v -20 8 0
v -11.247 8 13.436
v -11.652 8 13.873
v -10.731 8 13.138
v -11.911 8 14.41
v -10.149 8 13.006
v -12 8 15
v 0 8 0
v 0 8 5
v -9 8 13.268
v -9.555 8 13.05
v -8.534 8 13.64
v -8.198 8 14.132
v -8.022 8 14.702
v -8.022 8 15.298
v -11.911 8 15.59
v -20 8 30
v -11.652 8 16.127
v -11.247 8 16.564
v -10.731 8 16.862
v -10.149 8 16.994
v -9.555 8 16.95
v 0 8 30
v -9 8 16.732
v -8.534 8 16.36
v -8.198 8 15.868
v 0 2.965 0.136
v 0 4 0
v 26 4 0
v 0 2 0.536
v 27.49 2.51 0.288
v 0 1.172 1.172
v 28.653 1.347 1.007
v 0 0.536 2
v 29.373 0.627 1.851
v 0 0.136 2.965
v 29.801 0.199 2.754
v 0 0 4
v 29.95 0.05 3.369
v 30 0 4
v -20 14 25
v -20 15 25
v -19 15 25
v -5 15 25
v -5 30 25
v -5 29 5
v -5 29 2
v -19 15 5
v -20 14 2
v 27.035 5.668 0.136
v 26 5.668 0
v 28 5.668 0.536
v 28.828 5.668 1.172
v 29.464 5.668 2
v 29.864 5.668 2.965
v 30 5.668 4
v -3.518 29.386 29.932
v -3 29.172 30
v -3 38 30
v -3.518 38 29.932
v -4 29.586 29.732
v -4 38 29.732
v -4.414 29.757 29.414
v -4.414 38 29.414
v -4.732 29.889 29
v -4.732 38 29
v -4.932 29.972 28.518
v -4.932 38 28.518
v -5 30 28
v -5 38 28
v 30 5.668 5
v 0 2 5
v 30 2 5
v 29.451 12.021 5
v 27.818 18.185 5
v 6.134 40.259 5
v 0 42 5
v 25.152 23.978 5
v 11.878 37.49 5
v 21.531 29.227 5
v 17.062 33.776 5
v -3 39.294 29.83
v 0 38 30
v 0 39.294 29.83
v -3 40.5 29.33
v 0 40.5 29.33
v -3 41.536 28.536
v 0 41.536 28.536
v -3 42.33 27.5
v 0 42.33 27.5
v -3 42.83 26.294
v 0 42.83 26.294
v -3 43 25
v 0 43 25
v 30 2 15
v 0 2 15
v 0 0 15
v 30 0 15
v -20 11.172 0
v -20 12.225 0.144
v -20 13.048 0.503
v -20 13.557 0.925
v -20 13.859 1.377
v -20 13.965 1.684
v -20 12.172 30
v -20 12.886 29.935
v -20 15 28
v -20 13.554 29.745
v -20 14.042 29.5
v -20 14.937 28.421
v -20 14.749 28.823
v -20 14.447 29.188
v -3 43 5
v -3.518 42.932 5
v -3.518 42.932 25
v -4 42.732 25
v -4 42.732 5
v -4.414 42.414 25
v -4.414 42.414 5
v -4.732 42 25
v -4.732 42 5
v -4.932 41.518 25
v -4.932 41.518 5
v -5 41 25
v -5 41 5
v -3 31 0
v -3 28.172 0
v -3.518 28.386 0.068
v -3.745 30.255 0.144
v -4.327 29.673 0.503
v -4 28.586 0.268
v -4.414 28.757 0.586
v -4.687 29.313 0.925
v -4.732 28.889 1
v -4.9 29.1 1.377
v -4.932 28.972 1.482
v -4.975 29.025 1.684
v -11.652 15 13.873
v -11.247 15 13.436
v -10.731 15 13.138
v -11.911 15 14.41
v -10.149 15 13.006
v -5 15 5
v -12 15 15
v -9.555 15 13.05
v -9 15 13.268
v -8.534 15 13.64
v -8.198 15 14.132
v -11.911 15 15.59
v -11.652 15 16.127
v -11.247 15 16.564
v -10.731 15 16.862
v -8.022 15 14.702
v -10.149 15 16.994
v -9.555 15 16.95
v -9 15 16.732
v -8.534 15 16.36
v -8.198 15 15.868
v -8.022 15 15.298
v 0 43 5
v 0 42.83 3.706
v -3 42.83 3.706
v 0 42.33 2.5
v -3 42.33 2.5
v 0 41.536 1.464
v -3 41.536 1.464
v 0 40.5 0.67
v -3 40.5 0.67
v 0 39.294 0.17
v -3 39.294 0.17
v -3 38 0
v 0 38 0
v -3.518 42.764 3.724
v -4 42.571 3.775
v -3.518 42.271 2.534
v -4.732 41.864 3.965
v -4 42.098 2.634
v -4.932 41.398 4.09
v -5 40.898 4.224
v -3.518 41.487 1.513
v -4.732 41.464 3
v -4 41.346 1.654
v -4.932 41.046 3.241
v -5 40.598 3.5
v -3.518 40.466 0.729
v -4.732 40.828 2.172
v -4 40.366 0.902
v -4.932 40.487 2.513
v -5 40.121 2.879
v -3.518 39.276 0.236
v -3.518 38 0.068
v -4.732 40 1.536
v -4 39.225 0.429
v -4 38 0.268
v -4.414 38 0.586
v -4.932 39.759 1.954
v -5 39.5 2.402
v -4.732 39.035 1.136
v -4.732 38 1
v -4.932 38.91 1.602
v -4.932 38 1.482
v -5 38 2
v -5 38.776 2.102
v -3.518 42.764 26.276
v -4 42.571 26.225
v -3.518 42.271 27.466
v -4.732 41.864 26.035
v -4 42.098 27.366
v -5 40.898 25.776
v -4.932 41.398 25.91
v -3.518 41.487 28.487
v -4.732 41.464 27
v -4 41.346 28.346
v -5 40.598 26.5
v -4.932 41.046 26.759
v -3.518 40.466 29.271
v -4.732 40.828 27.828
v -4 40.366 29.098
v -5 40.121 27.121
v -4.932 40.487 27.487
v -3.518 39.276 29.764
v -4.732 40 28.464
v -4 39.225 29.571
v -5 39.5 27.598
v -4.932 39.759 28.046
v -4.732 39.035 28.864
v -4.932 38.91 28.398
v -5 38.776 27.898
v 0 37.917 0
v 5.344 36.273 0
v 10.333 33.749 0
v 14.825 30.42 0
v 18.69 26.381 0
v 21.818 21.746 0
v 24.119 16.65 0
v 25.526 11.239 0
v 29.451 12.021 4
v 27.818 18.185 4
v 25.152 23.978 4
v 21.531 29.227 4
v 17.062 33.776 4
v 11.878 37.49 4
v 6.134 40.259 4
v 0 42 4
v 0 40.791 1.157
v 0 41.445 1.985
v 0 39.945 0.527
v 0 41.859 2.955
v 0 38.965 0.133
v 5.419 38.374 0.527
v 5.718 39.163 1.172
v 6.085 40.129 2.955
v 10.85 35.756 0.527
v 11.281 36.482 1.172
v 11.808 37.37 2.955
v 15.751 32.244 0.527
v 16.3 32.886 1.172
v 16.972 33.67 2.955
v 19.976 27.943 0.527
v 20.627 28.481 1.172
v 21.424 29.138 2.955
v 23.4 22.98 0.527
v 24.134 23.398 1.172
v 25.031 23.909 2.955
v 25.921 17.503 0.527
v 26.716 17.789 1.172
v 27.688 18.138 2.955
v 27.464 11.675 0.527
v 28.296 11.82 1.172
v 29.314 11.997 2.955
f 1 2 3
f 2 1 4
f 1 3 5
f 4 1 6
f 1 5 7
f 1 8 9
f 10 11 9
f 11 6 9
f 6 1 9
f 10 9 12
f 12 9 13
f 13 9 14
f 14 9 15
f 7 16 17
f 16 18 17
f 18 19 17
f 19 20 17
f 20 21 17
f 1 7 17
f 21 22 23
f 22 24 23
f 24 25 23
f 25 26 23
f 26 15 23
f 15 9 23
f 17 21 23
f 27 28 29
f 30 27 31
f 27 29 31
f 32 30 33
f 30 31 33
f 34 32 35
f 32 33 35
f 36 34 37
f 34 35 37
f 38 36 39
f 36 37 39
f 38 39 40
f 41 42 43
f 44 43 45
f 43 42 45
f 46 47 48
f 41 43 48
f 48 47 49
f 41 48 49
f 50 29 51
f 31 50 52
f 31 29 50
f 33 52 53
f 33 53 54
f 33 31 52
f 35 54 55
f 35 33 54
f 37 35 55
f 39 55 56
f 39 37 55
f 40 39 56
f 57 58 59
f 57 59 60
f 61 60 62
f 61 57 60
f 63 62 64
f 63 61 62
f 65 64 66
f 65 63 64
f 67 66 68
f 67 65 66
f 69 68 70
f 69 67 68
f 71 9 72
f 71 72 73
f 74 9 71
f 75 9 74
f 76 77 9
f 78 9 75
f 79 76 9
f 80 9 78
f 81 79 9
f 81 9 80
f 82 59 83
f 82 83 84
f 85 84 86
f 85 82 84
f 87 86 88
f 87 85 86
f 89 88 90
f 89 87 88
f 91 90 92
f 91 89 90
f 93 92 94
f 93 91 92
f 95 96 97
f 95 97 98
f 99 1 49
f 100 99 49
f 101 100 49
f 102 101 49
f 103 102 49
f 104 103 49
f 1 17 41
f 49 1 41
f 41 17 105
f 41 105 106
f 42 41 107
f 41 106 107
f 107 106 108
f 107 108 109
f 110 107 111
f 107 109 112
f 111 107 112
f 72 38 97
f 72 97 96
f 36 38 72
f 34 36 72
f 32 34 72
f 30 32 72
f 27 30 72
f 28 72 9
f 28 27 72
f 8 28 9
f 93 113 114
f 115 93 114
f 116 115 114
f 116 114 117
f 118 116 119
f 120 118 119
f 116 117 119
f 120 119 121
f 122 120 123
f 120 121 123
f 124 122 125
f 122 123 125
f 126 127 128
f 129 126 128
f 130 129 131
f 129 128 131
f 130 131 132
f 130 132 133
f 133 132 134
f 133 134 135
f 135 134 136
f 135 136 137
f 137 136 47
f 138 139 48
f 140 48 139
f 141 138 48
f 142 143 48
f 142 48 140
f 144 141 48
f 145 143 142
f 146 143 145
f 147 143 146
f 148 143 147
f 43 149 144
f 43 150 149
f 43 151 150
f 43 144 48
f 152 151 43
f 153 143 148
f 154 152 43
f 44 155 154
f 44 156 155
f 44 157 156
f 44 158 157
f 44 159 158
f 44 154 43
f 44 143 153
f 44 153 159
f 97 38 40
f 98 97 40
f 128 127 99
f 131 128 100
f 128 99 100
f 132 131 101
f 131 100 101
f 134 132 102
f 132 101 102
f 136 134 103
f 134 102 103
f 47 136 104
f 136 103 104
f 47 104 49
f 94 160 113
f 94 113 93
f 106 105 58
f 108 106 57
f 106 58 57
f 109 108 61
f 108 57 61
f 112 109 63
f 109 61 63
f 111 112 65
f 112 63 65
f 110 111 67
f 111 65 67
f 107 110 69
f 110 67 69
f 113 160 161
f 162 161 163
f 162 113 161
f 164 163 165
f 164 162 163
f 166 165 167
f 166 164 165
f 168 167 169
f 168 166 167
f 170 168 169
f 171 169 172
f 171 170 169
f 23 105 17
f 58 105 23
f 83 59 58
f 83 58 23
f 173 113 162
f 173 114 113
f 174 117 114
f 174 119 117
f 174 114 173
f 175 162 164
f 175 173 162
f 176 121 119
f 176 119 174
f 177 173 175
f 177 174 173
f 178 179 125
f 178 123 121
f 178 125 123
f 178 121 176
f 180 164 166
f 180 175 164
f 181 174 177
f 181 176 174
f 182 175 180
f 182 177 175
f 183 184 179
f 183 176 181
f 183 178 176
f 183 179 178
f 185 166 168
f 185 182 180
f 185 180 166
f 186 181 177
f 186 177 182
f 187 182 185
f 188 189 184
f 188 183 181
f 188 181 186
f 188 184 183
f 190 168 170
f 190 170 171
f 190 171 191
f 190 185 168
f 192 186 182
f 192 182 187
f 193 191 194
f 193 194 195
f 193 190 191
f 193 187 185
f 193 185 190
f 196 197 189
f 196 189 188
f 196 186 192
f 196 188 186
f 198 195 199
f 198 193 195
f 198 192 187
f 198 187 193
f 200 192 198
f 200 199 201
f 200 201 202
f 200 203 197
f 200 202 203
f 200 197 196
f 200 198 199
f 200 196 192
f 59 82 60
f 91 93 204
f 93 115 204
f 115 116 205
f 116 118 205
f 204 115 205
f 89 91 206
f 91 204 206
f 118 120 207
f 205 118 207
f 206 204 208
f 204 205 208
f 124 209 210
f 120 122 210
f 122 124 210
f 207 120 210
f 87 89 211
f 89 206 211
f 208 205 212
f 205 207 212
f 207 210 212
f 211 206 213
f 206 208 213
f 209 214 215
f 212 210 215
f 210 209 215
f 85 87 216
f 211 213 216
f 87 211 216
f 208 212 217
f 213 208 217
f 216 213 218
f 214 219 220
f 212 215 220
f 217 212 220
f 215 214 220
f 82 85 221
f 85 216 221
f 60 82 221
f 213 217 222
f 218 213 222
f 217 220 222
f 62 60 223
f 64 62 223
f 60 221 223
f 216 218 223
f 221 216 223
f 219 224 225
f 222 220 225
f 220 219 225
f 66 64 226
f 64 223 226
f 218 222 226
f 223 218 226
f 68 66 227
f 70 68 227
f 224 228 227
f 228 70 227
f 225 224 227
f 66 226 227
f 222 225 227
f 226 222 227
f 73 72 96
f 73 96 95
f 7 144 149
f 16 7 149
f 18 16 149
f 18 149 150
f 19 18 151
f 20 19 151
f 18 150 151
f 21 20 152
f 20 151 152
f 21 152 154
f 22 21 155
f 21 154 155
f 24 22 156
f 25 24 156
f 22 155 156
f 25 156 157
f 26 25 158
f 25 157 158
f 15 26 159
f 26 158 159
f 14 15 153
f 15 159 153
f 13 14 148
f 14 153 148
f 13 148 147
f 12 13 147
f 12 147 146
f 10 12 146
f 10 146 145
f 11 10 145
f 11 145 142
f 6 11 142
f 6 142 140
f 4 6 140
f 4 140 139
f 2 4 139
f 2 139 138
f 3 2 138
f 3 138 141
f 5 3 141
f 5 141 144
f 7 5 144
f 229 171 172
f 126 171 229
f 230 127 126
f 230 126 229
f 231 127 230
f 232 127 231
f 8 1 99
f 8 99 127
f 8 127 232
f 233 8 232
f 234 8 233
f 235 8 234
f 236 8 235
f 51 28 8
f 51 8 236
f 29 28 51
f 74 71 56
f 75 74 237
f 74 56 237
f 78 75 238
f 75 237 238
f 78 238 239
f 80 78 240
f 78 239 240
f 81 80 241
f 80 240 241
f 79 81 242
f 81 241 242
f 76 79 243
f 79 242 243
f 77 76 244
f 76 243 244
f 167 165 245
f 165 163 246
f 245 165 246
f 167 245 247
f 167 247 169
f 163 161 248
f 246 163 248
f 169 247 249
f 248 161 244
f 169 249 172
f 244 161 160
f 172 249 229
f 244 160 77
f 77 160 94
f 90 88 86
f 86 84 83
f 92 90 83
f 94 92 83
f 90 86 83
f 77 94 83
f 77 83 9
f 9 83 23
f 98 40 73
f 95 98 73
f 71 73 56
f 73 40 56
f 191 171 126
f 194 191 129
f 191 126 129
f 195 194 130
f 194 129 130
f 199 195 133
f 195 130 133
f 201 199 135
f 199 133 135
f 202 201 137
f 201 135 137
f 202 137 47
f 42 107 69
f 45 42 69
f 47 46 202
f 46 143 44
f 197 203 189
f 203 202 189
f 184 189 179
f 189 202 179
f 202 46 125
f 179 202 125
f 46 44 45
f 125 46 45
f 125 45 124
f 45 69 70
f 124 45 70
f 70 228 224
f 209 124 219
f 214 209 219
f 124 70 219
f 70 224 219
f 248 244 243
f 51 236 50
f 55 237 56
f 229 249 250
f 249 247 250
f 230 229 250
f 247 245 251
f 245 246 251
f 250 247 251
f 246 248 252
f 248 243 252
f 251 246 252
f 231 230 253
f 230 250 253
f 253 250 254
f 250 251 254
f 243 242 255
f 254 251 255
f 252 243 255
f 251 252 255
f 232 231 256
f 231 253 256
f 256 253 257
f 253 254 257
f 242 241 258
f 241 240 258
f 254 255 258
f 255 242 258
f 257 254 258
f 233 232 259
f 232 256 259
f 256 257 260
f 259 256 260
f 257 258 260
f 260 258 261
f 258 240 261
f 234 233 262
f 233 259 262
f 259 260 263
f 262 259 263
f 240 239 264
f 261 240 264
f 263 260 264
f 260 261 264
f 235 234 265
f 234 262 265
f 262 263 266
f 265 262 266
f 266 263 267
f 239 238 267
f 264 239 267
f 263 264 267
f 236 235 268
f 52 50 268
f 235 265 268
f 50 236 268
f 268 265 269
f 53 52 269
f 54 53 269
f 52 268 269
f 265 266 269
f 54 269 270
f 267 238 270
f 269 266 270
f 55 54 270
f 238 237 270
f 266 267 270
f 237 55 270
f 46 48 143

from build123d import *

# Parameters (mm, degrees)
F0_W          = 30
F0_H          = 42
F1_DEPTH      = 5
F2_T1_DEPTH   = 186.6590212458
F3_W          = 30
F3_H          = 2
F4_DEPTH      = 10
F5_W          = 35
F5_H          = 30
F6_DEPTH      = 5
F7_W          = 7
F7_H          = 30
F8_DEPTH      = 15
F9_R          = 2
F10_DEPTH     = 10
F11_R         = 4
F12_W         = 15
F12_H         = 14
F13_DEPTH     = 5
F14_W         = 15
F14_H         = 15
F15_DEPTH     = 5
F16_T4_DEPTH  = 35.8601958556
F16_T9_DEPTH  = 35.8601958556
F17_R         = 5
F18_T1_DEPTH  = 20
F18_T6_DEPTH  = 9.5699020722
F18_T11_DEPTH = 31.2132034356
F18_T16_DEPTH = 31.2132034356
F18_T21_DEPTH = 14
F18_T24_ANGLE = 90
F18_T26_ANGLE = 90
F18_T30_DEPTH = 13
F18_T36_DEPTH = 14
F18_T40_DEPTH = 31.2132034356
F18_T47_DEPTH = 13
F18_T51_DEPTH = 31.2132034356


# Not quite as in the source:
# - a fillet or chamfer that OpenCascade refuses, or shapes differently, is made with other operations: its cross-section is extruded or revolved along the edge and cut away or added


with BuildPart() as f1:
    # F0 (on Top) → F1 (new body)
    with BuildSketch(Plane.XY):
        with Locations((15, 21)):
            Rectangle(F0_W, F0_H)
    extrude(amount=F1_DEPTH)

    # F2: fillet of radius 37 on 1 edges, made by hand

    # F2_s2 → F2_t1 (cut)
    with BuildSketch(Plane.XY.offset(-90.8295106229)):
        with BuildLine():
            ThreePointArc((30, 5.6681957508), (21.5306852354, 29.2266337296), (0, 42))
            Line((0, 42), (30, 42))
            Line((30, 42), (30, 5.6681957508))
        make_face()
    extrude(amount=F2_T1_DEPTH, mode=Mode.SUBTRACT)

    # F3 (on face) → F4 (join)
    with BuildSketch(Plane.XY.offset(5)):
        with Locations((15, 1)):
            Rectangle(F3_W, F3_H)
    extrude(amount=F4_DEPTH)

    # F5 (on face) → F6 (join)
    with BuildSketch(Plane(origin=(0, 0, 0), x_dir=(0, -1, 0), z_dir=(-1, 0, 0))):
        with Locations((-25.5, 15)):
            Rectangle(F5_W, F5_H)
    extrude(amount=F6_DEPTH)

    # F7 (on face) → F8 (join)
    with BuildSketch(Plane(origin=(-5, 0, 0), x_dir=(0, -1, 0), z_dir=(-1, 0, 0))):
        with Locations((-11.5, 15)):
            Rectangle(F7_W, F7_H)
    extrude(amount=F8_DEPTH)

    # F9 (on face) → F10 (cut)
    with BuildSketch(Plane(origin=(0, 15, 0), x_dir=(-1, 0, 0), z_dir=(0, 1, 0))):
        with Locations((10, 15)):
            Circle(F9_R)
    extrude(amount=-F10_DEPTH, mode=Mode.SUBTRACT)

    # F11
    f11_edges = [f1.edges().sort_by_distance(p)[0] for p in [
        (21.530685, 29.226634, 0),
        (15, 0, 0),
    ]]
    fillet(f11_edges, radius=F11_R)

    # F12 (on face) → F13 (join)
    with BuildSketch(Plane(origin=(0, 0, 0), x_dir=(1, 0, 0), z_dir=(0, 0, -1))):
        with Locations((-12.5, -22)):
            Rectangle(F12_W, F12_H)
    extrude(amount=-F13_DEPTH)

    # F14 (on face) → F15 (join)
    with BuildSketch(Plane.XY.offset(30)):
        with Locations((-12.5, 22.5)):
            Rectangle(F14_W, F14_H)
    extrude(amount=-F15_DEPTH)

    # F16: chamfer of 15 on 2 edges, made by hand


with BuildPart() as f16_tool2:
    # F16_s3 → F16_t4 (new body)
    with BuildSketch(Plane.XY.offset(45.4300979278)):
        with BuildLine():
            Line((-20.4242640687, 14.5757359313), (-4.5757359313, 30.4242640687))
            Line((-4.5757359313, 30.4242640687), (-4.5757359313, 30.7242640687))
            ThreePointArc((-4.5757359313, 30.7242640687), (-12.2878679656, 30.3), (-20, 30.3))
            Line((-20, 30.3), (-20.3, 30))
            ThreePointArc((-20.3, 30), (-20.3, 22.2878679656), (-20.7242640687, 14.5757359313))
            Line((-20.7242640687, 14.5757359313), (-20.4242640687, 14.5757359313))
        make_face()
    extrude(amount=-F16_T4_DEPTH)

    split(bisect_by=Plane.YZ.offset(-5), keep=Keep.BOTTOM)


with BuildPart() as f1_1:
    add(f1.part)

    # F16_t1: cut F16_tool2
    add(f16_tool2.part, mode=Mode.SUBTRACT)


with BuildPart() as f16_tool7:
    # F16_s8 → F16_t9 (new body)
    with BuildSketch(Plane.XY.offset(-15.4300979278)):
        with BuildLine():
            Line((-4.5757359313, 29.4242640687), (-20.4242640687, 13.5757359313))
            Line((-20.4242640687, 13.5757359313), (-20.7242640687, 13.5757359313))
            ThreePointArc((-20.7242640687, 13.5757359313), (-20.3, 21.2878679656), (-20.3, 29))
            Line((-20.3, 29), (-20, 29.3))
            ThreePointArc((-20, 29.3), (-12.2878679656, 29.3), (-4.5757359313, 29.7242640687))
            Line((-4.5757359313, 29.7242640687), (-4.5757359313, 29.4242640687))
        make_face()
    extrude(amount=F16_T9_DEPTH)

    split(bisect_by=Plane.YZ.offset(-5), keep=Keep.BOTTOM)


with BuildPart() as f1_2:
    add(f1_1.part)

    # F16_t6: cut F16_tool7
    add(f16_tool7.part, mode=Mode.SUBTRACT)

    # F17
    f17_edges = [f1_2.edges().sort_by_distance(p)[0] for p in [
        (-2.5, 43, 0),
        (-2.5, 43, 30),
    ]]
    fillet(f17_edges, radius=F17_R)

    # F18: fillet of radius 2 on 9 edges, made by hand

    # F18_s2 → F18_t1 (cut)
    with BuildSketch(Plane.XY.offset(5)):
        with BuildLine():
            ThreePointArc((-3, 43), (-4.4142135624, 42.4142135624), (-5, 41))
            Line((-5, 41), (-5, 43))
            Line((-5, 43), (-3, 43))
        make_face()
    extrude(amount=F18_T1_DEPTH, mode=Mode.SUBTRACT)


with BuildPart() as f18_tool4:
    # F18_s5 → F18_t6 (new body)
    with BuildSketch(Plane.XY.offset(25)):
        with BuildLine():
            ThreePointArc((-20, 13), (-19.4142135624, 14.4142135624), (-18, 15))
            Line((-18, 15), (-20, 15))
            Line((-20, 15), (-20, 13))
        make_face()
    extrude(amount=-F18_T6_DEPTH)

    split(bisect_by=Plane(origin=(-17, 17, 0), x_dir=(0, 0, 1), z_dir=(-0.7071067812, 0.7071067812, 0)), keep=Keep.TOP)


with BuildPart() as f1_3:
    add(f1_2.part)

    # F18_t3: cut F18_tool4
    add(f18_tool4.part, mode=Mode.SUBTRACT)


with BuildPart() as f18_tool9:
    # F18_s10 → F18_t11 (new body)
    with BuildSketch(Plane(origin=(-6.5355339059, -6.5355339059, 0), x_dir=(0, 0, 1), z_dir=(0.7071067812, 0.7071067812, 0))):
        with BuildLine():
            ThreePointArc((0, -22.0416305603), (0.5857864376, -23.4558441227), (2, -24.0416305603))
            Line((2, -24.0416305603), (0, -24.0416305603))
            Line((0, -24.0416305603), (0, -22.0416305603))
        make_face()
    extrude(amount=F18_T11_DEPTH)

    split(bisect_by=Plane.YZ.offset(-5), keep=Keep.BOTTOM)


with BuildPart() as f1_4:
    add(f1_3.part)

    # F18_t8: cut F18_tool9
    add(f18_tool9.part, mode=Mode.SUBTRACT)


with BuildPart() as f18_tool14:
    # F18_s15 → F18_t16 (new body)
    with BuildSketch(Plane(origin=(16.0355339059, 16.0355339059, 0), x_dir=(0, 0, 1), z_dir=(-0.7071067812, -0.7071067812, 0))):
        with BuildLine():
            ThreePointArc((30, 22.7487373415), (29.4142135624, 24.1629509039), (28, 24.7487373415))
            Line((28, 24.7487373415), (30, 24.7487373415))
            Line((30, 24.7487373415), (30, 22.7487373415))
        make_face()
    extrude(amount=F18_T16_DEPTH)

    split(bisect_by=Plane.YZ.offset(-5), keep=Keep.BOTTOM)


with BuildPart() as f1_5:
    add(f1_4.part)

    # F18_t13: cut F18_tool14
    add(f18_tool14.part, mode=Mode.SUBTRACT)


with BuildPart() as f18_tool19:
    # F18_s20 → F18_t21 (new body)
    with BuildSketch(Plane.XZ.offset(-24)):
        with BuildLine():
            ThreePointArc((-3, 0), (-4.4142135624, 0.5857864376), (-5, 2))
            Line((-5, 2), (-5, 0))
            Line((-5, 0), (-3, 0))
        make_face()
    extrude(amount=-F18_T21_DEPTH)

    split(bisect_by=Plane(origin=(-17, 17, 0), x_dir=(0, 0, 1), z_dir=(-0.7071067812, 0.7071067812, 0)), keep=Keep.TOP)


with BuildPart() as f1_6:
    add(f1_5.part)

    # F18_t18: cut F18_tool19
    add(f18_tool19.part, mode=Mode.SUBTRACT)

    # F18_s23 → F18_t24 (revolve, cut)
    with BuildSketch(Plane.XY.offset(5)):
        with BuildLine():
            ThreePointArc((-3, 43), (-4.4142135624, 42.4142135624), (-5, 41))
            Line((-5, 41), (-5, 43))
            Line((-5, 43), (-3, 43))
        make_face()
    revolve(axis=Axis((-5, 38, 5), (-1, 0, 0)), revolution_arc=F18_T24_ANGLE, mode=Mode.SUBTRACT)

    # F18_s25 → F18_t26 (revolve, cut)
    with BuildSketch(Plane.XY.offset(25)):
        with BuildLine():
            ThreePointArc((-3, 43), (-4.4142135624, 42.4142135624), (-5, 41))
            Line((-5, 41), (-5, 43))
            Line((-5, 43), (-3, 43))
        make_face()
    revolve(axis=Axis((-5, 38, 25), (1, 0, 0)), revolution_arc=F18_T26_ANGLE, mode=Mode.SUBTRACT)


with BuildPart() as f18_tool28:
    # F18_s29 → F18_t30 (new body)
    with BuildSketch(Plane.XZ.offset(-25)):
        with BuildLine():
            ThreePointArc((-3, 30), (-4.4142135624, 29.4142135624), (-5, 28))
            Line((-5, 28), (-5, 30))
            Line((-5, 30), (-3, 30))
        make_face()
    extrude(amount=-F18_T30_DEPTH)

    split(bisect_by=Plane(origin=(-17.5, 17.5, 0), x_dir=(0, 0, 1), z_dir=(-0.7071067812, 0.7071067812, 0)), keep=Keep.TOP)


with BuildPart() as f1_7:
    add(f1_6.part)

    # F18_t27: cut F18_tool28
    add(f18_tool28.part, mode=Mode.SUBTRACT)


with BuildPart() as f18_tool34:
    # F18_s35 → F18_t36 (new body)
    with BuildSketch(Plane.XZ.offset(-24)):
        with BuildLine():
            ThreePointArc((-3, 0), (-4.4142135624, 0.5857864376), (-5, 2))
            Line((-5, 2), (-5, 0))
            Line((-5, 0), (-3, 0))
        make_face()
    extrude(amount=-F18_T36_DEPTH)

    split(bisect_by=Plane(origin=(-17, 17, 0), x_dir=(0, 0, 1), z_dir=(0.7071067812, -0.7071067812, 0)), keep=Keep.TOP)


with BuildPart() as f18_tool38:
    # F18_s39 → F18_t40 (new body)
    with BuildSketch(Plane(origin=(-6.5355339059, -6.5355339059, 0), x_dir=(0, 0, 1), z_dir=(0.7071067812, 0.7071067812, 0))):
        with BuildLine():
            ThreePointArc((0, -22.0416305603), (0.5857864376, -23.4558441227), (2, -24.0416305603))
            Line((2, -24.0416305603), (0, -24.0416305603))
            Line((0, -24.0416305603), (0, -22.0416305603))
        make_face()
    extrude(amount=F18_T40_DEPTH)

    split(bisect_by=Plane.YZ.offset(-5), keep=Keep.TOP)


with BuildPart() as f18_tool34_1:
    add(f18_tool34.part)

    # F18_t42: intersect F18_tool38
    add(f18_tool38.part, mode=Mode.INTERSECT)


with BuildPart() as f1_8:
    add(f1_7.part)

    # F18_t32: cut F18_tool34
    add(f18_tool34_1.part, mode=Mode.SUBTRACT)


with BuildPart() as f18_tool45:
    # F18_s46 → F18_t47 (new body)
    with BuildSketch(Plane.XZ.offset(-25)):
        with BuildLine():
            ThreePointArc((-3, 30), (-4.4142135624, 29.4142135624), (-5, 28))
            Line((-5, 28), (-5, 30))
            Line((-5, 30), (-3, 30))
        make_face()
    extrude(amount=-F18_T47_DEPTH)

    split(bisect_by=Plane(origin=(-17.5, 17.5, 0), x_dir=(0, 0, 1), z_dir=(0.7071067812, -0.7071067812, 0)), keep=Keep.TOP)


with BuildPart() as f18_tool49:
    # F18_s50 → F18_t51 (new body)
    with BuildSketch(Plane(origin=(16.0355339059, 16.0355339059, 0), x_dir=(0, 0, 1), z_dir=(-0.7071067812, -0.7071067812, 0))):
        with BuildLine():
            ThreePointArc((30, 22.7487373415), (29.4142135624, 24.1629509039), (28, 24.7487373415))
            Line((28, 24.7487373415), (30, 24.7487373415))
            Line((30, 24.7487373415), (30, 22.7487373415))
        make_face()
    extrude(amount=F18_T51_DEPTH)

    split(bisect_by=Plane.YZ.offset(-5), keep=Keep.TOP)


with BuildPart() as f18_tool45_1:
    add(f18_tool45.part)

    # F18_t53: intersect F18_tool49
    add(f18_tool49.part, mode=Mode.INTERSECT)


with BuildPart() as f1_9:
    add(f1_8.part)

    # F18_t43: cut F18_tool45
    add(f18_tool45_1.part, mode=Mode.SUBTRACT)


solid = f1_9.part
